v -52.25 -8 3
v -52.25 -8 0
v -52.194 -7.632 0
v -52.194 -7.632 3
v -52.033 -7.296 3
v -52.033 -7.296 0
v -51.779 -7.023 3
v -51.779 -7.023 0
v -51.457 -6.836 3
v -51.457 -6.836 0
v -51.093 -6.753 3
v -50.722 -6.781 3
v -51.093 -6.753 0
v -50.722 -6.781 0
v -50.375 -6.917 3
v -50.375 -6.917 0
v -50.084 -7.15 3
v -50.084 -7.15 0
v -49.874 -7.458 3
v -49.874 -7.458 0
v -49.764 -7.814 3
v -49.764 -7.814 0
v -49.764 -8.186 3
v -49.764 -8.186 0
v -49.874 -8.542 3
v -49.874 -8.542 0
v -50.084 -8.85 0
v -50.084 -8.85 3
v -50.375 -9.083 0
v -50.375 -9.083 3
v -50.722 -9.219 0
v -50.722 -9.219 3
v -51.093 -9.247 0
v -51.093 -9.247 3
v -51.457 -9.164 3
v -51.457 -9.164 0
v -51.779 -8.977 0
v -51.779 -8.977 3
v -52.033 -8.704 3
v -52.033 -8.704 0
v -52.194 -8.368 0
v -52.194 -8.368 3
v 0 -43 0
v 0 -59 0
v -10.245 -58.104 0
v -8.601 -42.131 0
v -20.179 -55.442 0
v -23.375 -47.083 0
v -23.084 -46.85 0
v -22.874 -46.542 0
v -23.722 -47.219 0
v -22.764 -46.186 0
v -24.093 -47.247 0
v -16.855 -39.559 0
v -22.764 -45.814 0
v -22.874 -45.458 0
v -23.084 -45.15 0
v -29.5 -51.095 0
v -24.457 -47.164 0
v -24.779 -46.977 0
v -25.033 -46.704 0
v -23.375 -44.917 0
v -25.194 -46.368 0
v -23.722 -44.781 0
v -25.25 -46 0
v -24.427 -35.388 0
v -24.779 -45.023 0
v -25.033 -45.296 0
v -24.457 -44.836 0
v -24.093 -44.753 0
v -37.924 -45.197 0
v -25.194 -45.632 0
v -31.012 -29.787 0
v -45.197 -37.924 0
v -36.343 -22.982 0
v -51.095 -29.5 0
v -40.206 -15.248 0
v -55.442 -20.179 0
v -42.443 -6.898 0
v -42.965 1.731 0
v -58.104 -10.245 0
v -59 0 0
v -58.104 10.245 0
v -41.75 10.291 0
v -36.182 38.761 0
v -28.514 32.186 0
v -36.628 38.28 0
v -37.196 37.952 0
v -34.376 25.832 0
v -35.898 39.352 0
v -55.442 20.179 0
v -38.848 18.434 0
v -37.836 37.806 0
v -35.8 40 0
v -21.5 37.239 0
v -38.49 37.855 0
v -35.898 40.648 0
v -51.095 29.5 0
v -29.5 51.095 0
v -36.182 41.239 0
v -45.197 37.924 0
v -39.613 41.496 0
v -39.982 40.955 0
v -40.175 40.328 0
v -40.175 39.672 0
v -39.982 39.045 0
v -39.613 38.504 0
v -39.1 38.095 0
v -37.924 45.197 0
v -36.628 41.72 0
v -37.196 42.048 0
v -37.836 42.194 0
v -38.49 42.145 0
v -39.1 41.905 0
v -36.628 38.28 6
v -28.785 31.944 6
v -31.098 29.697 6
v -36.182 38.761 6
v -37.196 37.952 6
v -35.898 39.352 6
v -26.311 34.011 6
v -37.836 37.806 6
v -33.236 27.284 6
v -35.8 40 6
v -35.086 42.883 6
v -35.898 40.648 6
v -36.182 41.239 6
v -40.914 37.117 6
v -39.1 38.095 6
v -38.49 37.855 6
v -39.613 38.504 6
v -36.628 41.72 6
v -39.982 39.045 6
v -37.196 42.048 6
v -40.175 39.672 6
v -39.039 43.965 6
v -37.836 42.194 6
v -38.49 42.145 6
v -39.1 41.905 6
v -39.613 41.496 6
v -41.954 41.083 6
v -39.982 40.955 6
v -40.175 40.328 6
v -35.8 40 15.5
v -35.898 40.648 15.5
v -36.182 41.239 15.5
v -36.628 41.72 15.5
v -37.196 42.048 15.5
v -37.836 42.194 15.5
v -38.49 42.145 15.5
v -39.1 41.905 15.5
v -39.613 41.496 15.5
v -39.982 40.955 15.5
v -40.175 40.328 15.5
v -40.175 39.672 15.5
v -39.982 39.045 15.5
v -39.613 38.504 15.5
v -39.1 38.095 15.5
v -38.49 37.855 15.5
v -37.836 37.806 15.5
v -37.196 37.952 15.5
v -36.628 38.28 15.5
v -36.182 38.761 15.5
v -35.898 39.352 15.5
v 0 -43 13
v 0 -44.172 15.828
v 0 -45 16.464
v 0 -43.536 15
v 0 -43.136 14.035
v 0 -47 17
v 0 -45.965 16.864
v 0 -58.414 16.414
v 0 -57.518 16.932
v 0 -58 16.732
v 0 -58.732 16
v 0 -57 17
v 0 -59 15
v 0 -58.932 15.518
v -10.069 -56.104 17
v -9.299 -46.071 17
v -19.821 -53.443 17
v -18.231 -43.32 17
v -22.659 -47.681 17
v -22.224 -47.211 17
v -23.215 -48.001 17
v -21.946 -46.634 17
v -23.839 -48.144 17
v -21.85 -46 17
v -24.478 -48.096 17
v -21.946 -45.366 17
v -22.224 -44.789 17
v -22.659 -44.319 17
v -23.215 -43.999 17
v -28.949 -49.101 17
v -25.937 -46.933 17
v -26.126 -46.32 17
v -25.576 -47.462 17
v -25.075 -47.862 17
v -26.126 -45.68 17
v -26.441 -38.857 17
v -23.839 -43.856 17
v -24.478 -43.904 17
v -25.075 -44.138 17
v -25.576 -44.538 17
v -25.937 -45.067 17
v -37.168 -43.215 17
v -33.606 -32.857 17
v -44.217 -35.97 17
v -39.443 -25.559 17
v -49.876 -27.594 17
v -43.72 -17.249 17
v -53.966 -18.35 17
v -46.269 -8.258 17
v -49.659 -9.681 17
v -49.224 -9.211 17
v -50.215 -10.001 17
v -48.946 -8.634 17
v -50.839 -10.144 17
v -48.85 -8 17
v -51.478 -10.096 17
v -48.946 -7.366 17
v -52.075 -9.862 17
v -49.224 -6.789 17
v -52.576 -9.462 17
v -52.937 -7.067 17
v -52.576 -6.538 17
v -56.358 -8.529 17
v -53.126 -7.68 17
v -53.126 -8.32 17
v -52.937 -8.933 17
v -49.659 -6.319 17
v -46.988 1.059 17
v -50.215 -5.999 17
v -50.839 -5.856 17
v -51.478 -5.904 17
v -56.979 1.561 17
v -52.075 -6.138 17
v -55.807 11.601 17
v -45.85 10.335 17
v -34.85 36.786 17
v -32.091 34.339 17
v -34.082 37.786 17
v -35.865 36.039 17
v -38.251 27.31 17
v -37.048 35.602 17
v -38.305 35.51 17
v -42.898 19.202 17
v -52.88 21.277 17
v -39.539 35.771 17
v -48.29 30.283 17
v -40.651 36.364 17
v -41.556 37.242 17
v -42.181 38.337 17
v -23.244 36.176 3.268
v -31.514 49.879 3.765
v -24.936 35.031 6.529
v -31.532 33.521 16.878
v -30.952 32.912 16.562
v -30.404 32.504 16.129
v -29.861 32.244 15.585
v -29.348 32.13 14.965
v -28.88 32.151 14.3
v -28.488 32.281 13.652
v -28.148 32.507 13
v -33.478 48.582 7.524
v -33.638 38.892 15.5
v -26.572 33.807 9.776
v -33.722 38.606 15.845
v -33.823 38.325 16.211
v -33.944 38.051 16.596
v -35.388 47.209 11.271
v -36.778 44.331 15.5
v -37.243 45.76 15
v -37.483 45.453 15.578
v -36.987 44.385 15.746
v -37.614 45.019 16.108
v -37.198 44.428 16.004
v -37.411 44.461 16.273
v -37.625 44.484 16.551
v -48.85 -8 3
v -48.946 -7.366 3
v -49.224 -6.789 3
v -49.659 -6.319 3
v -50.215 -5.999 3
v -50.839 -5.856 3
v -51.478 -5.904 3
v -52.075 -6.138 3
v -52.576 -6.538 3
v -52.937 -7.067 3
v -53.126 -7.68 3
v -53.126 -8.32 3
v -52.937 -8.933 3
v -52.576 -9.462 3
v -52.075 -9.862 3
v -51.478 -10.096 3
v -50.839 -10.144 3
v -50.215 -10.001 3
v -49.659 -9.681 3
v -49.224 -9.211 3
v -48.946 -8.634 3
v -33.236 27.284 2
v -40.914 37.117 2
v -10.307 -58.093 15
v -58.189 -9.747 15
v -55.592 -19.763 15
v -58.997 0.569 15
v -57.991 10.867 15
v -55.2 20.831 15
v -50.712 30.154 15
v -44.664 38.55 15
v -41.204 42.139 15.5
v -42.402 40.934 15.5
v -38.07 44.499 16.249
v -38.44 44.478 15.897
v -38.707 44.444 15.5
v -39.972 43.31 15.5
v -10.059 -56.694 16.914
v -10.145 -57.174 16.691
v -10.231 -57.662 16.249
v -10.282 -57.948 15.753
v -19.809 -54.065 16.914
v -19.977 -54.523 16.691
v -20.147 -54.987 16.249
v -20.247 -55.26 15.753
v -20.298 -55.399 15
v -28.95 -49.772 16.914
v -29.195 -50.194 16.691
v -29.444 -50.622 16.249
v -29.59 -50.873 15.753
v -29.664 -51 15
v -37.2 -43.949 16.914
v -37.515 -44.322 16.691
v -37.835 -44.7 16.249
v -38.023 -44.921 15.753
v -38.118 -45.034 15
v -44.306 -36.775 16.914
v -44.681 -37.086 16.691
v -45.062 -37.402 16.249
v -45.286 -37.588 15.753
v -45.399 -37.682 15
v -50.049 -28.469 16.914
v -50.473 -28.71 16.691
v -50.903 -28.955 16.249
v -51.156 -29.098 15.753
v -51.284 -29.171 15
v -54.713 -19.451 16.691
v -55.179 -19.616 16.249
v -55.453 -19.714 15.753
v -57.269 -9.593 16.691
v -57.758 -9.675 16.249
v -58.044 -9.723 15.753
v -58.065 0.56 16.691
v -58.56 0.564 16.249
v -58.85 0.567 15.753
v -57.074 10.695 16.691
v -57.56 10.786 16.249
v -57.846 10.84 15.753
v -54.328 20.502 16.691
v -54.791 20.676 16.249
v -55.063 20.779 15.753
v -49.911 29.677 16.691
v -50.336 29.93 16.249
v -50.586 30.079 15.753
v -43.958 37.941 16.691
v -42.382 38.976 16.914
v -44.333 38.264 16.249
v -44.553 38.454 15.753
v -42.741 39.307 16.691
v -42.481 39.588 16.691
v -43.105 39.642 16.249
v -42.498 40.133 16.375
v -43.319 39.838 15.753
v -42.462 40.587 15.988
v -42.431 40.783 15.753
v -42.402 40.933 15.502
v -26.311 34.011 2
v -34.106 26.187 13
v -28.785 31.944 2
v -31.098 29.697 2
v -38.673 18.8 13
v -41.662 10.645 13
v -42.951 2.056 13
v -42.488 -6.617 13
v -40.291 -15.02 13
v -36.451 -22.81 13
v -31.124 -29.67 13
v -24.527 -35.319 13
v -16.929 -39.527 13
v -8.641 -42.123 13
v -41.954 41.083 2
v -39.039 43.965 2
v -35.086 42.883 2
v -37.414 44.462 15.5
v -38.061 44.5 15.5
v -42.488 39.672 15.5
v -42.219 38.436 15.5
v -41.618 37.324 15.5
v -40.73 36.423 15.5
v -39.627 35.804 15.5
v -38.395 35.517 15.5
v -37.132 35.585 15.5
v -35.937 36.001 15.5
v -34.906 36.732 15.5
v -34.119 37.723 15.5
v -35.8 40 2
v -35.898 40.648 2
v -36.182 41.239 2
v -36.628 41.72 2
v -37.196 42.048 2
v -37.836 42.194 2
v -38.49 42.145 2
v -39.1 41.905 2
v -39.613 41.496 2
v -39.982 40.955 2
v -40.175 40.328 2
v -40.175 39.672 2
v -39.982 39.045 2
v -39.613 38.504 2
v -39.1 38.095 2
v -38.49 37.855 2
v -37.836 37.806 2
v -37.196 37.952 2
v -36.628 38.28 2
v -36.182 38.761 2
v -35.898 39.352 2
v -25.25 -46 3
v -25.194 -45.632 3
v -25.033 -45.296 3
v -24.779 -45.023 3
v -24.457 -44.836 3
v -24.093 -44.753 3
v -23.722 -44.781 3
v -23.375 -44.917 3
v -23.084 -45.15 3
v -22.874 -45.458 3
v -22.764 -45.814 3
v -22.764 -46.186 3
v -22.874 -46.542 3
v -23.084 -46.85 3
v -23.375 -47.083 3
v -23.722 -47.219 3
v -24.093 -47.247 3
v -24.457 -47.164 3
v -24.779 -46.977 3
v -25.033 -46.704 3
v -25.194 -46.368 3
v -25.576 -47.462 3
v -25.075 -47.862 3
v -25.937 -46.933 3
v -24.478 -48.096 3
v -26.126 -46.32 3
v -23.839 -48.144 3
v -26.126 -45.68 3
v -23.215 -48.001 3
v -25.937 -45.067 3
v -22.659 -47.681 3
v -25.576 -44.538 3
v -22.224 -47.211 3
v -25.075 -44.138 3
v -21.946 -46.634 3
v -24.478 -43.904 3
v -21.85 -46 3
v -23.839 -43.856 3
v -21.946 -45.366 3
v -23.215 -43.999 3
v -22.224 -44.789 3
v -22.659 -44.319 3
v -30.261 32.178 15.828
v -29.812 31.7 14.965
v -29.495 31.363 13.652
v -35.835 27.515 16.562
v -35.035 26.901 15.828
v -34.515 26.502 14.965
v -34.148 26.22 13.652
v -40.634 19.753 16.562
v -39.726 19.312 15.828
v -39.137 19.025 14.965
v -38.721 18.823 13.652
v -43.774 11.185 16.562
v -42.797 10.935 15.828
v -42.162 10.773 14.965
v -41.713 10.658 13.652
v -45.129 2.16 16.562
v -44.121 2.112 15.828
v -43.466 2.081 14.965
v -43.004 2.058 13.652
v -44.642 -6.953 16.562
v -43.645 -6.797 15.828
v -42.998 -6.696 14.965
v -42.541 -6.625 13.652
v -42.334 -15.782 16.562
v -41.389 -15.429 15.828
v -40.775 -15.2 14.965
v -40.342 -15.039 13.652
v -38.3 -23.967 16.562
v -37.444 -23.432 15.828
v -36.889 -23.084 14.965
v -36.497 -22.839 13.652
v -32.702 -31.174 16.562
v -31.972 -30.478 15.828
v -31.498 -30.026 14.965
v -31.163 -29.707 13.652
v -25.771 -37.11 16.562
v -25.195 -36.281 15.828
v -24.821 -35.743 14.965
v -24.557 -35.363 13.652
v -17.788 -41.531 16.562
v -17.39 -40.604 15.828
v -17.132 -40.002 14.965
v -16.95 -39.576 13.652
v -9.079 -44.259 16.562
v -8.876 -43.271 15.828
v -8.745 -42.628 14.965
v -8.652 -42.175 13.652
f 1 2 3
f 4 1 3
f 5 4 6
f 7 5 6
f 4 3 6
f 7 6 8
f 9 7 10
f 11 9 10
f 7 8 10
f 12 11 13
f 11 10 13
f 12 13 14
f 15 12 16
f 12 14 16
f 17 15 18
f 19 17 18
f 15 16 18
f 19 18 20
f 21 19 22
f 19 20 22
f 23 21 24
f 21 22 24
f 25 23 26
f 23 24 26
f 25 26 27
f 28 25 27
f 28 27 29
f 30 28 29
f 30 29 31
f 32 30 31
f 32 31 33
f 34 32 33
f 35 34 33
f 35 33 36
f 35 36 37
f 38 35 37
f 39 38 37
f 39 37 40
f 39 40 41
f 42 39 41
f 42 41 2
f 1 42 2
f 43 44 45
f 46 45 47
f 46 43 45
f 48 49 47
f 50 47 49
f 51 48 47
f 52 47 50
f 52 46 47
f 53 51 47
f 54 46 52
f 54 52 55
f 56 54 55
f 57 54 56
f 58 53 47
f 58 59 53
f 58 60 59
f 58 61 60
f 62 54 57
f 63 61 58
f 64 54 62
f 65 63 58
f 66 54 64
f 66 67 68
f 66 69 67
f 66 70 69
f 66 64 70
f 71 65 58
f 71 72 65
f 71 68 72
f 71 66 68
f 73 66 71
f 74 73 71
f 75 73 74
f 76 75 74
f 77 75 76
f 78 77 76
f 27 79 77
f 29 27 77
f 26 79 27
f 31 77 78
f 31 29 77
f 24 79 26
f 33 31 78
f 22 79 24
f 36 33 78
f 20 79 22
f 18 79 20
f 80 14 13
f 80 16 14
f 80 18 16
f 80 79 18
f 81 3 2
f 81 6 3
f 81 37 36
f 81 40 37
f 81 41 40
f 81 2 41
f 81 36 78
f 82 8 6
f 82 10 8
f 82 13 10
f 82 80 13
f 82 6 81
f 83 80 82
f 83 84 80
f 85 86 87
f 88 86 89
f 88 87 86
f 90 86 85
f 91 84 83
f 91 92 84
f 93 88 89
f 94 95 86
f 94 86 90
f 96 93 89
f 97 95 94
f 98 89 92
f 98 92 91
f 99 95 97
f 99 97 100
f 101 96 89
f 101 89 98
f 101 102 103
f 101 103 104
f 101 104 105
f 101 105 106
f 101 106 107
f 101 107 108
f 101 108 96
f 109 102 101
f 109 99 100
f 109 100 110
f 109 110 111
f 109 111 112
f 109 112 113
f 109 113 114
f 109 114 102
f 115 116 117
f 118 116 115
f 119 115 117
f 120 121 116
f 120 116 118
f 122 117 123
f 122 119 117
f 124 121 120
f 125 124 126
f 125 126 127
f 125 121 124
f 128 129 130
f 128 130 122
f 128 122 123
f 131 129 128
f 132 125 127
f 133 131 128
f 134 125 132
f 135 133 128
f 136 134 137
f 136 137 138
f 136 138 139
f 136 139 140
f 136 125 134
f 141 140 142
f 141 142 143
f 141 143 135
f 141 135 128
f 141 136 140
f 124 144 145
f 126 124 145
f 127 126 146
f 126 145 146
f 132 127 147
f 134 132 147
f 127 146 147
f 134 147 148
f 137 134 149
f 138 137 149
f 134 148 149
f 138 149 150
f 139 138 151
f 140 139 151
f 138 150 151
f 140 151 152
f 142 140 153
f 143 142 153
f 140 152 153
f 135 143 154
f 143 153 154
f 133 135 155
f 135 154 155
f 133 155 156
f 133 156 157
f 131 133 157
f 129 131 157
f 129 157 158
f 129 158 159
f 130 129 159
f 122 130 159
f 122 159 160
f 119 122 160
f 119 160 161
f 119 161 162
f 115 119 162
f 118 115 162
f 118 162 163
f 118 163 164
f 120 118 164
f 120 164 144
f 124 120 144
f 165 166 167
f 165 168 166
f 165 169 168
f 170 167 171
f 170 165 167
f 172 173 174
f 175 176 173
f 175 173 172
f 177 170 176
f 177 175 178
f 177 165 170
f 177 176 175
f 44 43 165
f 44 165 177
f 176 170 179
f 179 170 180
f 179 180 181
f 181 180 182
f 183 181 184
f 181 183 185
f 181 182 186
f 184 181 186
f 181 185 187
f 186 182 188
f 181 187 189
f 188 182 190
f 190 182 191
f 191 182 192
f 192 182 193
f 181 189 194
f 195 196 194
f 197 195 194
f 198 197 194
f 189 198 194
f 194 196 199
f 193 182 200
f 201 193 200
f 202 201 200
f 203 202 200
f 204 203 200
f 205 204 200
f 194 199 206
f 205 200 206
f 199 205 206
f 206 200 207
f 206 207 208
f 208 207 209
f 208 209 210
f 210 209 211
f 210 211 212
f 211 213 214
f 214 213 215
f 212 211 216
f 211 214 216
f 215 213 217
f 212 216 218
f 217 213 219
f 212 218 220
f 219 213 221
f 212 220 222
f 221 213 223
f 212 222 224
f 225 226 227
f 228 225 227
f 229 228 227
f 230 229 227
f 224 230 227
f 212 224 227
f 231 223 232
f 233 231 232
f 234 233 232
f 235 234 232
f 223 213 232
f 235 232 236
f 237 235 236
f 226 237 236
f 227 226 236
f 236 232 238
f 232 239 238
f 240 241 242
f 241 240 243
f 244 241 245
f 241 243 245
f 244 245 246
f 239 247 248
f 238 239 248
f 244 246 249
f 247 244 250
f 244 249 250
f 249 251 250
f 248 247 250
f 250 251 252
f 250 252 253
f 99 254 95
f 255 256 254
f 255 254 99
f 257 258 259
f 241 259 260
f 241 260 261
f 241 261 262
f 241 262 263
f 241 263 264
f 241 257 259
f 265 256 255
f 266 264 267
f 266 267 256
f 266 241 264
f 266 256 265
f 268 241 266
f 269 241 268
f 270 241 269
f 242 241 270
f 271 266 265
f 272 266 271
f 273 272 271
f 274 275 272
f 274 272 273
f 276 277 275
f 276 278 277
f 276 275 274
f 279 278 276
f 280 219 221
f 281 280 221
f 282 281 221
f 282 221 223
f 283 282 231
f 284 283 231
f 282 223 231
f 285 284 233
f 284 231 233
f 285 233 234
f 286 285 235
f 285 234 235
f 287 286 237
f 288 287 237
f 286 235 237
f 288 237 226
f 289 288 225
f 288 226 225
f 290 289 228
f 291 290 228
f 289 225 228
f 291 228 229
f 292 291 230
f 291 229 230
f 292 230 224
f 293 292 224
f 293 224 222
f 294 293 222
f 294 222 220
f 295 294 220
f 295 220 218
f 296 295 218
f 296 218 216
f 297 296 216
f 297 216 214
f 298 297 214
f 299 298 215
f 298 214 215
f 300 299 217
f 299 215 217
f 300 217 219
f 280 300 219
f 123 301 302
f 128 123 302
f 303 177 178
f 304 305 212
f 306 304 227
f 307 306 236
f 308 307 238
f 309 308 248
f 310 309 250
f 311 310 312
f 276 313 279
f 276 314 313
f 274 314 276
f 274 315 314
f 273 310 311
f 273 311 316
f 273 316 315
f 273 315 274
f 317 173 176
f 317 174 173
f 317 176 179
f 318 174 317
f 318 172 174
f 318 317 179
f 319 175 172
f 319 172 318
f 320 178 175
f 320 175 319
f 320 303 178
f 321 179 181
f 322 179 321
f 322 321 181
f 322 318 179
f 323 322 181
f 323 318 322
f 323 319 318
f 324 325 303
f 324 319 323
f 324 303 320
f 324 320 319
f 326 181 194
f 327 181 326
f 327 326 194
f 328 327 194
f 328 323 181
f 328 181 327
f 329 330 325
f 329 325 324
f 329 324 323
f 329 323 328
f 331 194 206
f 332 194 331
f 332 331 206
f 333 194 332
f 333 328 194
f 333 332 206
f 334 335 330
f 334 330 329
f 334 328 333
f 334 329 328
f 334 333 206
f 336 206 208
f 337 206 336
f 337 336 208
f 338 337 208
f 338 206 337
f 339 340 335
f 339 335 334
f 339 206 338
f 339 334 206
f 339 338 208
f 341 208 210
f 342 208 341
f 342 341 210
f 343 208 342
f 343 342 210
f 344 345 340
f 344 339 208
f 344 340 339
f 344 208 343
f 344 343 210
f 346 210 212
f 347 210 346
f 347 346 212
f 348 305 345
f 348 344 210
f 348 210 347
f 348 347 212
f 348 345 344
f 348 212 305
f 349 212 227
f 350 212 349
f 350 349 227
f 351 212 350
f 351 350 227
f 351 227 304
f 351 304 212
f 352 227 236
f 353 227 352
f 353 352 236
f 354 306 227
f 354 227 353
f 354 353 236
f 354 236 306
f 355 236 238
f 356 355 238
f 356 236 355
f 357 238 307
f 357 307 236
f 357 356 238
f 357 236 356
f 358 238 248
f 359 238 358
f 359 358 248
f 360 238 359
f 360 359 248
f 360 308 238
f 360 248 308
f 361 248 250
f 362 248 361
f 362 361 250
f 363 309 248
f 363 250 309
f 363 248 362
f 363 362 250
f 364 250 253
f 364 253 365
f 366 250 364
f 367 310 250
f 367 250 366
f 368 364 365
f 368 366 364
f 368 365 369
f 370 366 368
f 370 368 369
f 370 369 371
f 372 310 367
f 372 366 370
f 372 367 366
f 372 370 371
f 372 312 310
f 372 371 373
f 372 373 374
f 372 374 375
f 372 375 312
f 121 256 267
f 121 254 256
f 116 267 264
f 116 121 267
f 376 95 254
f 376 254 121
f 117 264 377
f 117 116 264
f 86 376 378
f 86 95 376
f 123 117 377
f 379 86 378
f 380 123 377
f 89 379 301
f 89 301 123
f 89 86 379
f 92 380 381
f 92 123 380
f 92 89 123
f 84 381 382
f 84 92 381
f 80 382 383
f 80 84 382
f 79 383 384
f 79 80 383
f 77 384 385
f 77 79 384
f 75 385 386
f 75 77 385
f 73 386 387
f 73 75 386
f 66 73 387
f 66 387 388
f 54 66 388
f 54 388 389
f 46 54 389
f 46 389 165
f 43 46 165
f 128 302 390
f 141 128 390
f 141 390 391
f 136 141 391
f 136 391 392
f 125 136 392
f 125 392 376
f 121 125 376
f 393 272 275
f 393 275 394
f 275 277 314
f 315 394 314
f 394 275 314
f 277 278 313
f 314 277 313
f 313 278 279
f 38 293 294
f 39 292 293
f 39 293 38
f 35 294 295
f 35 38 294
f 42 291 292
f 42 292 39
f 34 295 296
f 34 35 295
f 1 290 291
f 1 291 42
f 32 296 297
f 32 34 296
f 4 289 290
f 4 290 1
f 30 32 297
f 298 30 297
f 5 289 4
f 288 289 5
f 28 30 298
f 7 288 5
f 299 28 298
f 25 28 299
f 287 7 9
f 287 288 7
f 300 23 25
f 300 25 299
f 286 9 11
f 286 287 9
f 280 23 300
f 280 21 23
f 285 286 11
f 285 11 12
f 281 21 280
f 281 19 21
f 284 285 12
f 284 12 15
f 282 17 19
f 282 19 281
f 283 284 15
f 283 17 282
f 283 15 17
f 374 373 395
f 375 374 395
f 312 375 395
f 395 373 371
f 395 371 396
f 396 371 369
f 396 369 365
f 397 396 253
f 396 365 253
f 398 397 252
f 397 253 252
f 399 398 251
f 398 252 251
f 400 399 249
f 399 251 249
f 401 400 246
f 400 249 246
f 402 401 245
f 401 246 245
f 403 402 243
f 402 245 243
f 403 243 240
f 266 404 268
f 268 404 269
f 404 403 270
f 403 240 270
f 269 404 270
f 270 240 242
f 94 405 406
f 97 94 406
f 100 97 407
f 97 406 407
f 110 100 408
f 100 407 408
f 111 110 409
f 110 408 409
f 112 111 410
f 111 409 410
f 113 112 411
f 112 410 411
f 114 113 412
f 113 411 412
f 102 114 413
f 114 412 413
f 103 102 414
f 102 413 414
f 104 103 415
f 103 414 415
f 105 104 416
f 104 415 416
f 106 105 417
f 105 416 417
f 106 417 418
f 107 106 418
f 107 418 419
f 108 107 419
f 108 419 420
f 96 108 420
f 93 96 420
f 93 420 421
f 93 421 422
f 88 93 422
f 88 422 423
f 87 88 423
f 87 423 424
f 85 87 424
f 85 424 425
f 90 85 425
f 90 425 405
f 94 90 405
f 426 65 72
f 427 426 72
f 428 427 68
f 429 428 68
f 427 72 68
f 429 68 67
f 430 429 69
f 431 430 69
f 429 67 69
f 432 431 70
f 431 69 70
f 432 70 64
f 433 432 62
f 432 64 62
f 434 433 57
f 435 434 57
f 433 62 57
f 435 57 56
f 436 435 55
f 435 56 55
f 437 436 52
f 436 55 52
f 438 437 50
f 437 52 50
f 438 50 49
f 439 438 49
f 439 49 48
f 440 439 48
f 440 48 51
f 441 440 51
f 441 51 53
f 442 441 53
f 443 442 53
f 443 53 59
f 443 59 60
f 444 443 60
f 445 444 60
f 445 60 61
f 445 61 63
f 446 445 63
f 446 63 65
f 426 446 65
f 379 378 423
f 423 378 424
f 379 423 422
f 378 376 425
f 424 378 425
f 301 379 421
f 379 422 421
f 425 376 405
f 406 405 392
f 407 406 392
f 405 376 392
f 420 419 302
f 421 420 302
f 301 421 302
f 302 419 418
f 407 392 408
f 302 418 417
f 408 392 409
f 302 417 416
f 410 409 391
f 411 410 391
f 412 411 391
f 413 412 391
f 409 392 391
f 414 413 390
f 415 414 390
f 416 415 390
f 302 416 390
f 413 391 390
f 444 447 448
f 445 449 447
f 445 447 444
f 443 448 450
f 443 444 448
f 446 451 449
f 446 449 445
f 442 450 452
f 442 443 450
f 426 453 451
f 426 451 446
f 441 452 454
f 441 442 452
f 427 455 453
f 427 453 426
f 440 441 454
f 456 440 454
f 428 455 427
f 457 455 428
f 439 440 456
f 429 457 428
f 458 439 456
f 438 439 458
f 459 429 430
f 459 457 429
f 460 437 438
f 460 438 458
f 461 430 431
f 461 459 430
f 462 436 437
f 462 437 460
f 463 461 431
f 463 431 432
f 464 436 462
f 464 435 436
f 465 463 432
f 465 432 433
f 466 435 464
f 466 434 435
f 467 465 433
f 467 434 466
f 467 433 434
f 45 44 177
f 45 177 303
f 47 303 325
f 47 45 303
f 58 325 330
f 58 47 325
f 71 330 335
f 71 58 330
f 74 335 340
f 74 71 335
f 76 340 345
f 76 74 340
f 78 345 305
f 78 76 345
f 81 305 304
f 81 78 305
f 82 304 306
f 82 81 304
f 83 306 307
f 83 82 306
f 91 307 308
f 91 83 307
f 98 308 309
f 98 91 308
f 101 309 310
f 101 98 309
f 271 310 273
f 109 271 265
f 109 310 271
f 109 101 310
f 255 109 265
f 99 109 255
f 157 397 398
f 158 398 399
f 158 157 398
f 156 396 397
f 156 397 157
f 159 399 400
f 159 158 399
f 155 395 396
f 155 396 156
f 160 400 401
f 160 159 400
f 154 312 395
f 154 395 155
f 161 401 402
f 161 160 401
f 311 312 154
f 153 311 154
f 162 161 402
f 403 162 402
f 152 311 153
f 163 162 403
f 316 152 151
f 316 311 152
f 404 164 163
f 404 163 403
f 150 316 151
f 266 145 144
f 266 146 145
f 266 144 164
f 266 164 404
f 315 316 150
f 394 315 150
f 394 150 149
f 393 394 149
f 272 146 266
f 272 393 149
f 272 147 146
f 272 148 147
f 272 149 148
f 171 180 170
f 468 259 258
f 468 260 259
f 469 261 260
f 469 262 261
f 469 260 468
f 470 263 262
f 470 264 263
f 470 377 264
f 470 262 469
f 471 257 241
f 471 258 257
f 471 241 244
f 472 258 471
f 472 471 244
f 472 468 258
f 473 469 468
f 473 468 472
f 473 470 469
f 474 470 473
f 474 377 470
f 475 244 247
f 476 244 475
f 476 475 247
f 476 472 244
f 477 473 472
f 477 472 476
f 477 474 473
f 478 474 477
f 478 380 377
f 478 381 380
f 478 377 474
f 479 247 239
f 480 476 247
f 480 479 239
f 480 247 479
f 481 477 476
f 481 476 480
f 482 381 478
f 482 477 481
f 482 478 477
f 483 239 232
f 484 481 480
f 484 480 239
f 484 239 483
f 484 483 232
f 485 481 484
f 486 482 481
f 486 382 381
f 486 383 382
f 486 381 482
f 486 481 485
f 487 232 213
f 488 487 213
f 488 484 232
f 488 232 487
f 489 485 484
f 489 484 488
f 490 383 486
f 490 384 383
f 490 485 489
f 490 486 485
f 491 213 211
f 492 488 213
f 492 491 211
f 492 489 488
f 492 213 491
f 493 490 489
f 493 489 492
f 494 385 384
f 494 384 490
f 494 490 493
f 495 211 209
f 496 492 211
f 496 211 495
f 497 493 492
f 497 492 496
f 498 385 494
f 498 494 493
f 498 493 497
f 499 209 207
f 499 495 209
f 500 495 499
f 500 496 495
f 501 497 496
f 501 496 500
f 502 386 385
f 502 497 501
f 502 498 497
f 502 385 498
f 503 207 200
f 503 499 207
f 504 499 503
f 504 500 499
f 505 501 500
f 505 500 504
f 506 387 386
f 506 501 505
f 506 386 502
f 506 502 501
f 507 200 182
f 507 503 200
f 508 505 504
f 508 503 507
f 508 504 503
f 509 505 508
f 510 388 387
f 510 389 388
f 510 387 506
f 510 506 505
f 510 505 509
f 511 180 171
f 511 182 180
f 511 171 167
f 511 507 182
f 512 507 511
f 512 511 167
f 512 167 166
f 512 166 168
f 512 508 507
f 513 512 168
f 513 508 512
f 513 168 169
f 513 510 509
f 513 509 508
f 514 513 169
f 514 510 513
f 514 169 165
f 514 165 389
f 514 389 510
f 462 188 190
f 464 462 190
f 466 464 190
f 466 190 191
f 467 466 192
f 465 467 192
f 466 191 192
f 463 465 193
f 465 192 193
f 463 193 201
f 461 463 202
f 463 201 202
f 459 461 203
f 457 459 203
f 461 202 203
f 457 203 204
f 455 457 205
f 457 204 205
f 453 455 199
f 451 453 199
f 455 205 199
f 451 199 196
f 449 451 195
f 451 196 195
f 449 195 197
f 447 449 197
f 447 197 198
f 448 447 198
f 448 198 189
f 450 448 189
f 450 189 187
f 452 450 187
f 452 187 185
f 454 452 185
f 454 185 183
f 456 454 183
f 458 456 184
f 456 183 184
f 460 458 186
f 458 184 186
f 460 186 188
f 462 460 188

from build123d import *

# Parameters (mm, degrees)
BOSS_EXTRUDE1_DEPTH = 17
SKETCH2_R           = 2.2
CUT_EXTRUDE1_DEPTH  = 86.152803829
CUT_EXTRUDE2_DEPTH  = 86.152803829
DRAFT1_ANGLE        = -32
SKETCH4_R           = 4.5
CUT_EXTRUDE3_DEPTH  = 1.5
FILLET1_R           = 4
CUT_EXTRUDE4_START  = -2
CUT_EXTRUDE4_DEPTH  = 4
SKETCH10_R          = 1.25
CUT_EXTRUDE5_DEPTH  = 86.152803849
SKETCH11_R          = 2.15
CUT_EXTRUDE6_DEPTH  = 14
FILLET2_R           = 2


with BuildPart() as part:
    # Sketch1 → Boss-Extrude1 (new body)
    with BuildSketch(Plane.XY):
        with BuildLine():
            Line((0, 59), (0, 43))
            ThreePointArc((0, 43), (-43, 0), (0, -43))
            Line((0, -43), (0, -59))
            ThreePointArc((0, -59), (-59, 0), (0, 59))
        make_face()
    extrude(amount=BOSS_EXTRUDE1_DEPTH)

    # Sketch2 → Cut-Extrude1 (cut, through all)
    with BuildSketch(Plane.XY.offset(17)):
        with Locations((-38, 40)):
            Circle(SKETCH2_R)
    extrude(amount=-CUT_EXTRUDE1_DEPTH, mode=Mode.SUBTRACT)

    # Sketch3 → Cut-Extrude2 (cut, through all)
    with BuildSketch(Plane.XY.offset(17)):
        Polygon((0, 0), (-48.717134113, 84.380551482), (0, 84.380551482), align=None)
    extrude(amount=-CUT_EXTRUDE2_DEPTH, mode=Mode.SUBTRACT)

    # Draft1
    draft1_faces = [part.faces().sort_by_distance(p)[0] for p in [
        (-25.5, 44.167295593, 8.5),
    ]]
    draft(draft1_faces, Plane(origin=(0, 0, 0), x_dir=(-1, 0, 0), z_dir=(0, 0, -1)), DRAFT1_ANGLE)

    # Sketch4 → Cut-Extrude3 (cut)
    with BuildSketch(Plane.XY.offset(17)):
        with Locations((-38, 40)):
            Circle(SKETCH4_R)
    extrude(amount=-CUT_EXTRUDE3_DEPTH, mode=Mode.SUBTRACT)

    # Fillet1
    fillet1_edges = [part.edges().sort_by_distance(p)[0] for p in [
        (-39.826243941, -16.213275226, 17),
    ]]
    fillet(fillet1_edges, radius=FILLET1_R)

    # Sketch9 → Cut-Extrude4 (cut)
    with BuildSketch(Plane(origin=(0, 0, 0), x_dir=(-1, 0, 0), z_dir=(0, 0, -1)).offset(CUT_EXTRUDE4_START)):
        Polygon((40.91436799, 37.11732892), (41.953650381, 41.082581175), (39.039282391, 43.965252255), (35.08563201, 42.88267108), (21.021032653, 28.663421982), (28.6051551, 21.353976547), align=None)
    extrude(amount=-CUT_EXTRUDE4_DEPTH, mode=Mode.SUBTRACT)

    # Sketch10 → Cut-Extrude5 (cut, through all)
    with BuildSketch(Plane(origin=(0, 0, 0), x_dir=(-1, 0, 0), z_dir=(0, 0, -1))):
        with Locations((24, -46)):
            Circle(SKETCH10_R)
        with Locations((51, -8)):
            Circle(SKETCH10_R)
    extrude(amount=-CUT_EXTRUDE5_DEPTH, mode=Mode.SUBTRACT)

    # Sketch11 → Cut-Extrude6 (cut)
    with BuildSketch(Plane.XY.offset(17)):
        with Locations((-51, -8)):
            Circle(SKETCH11_R)
        with Locations((-24, -46)):
            Circle(SKETCH11_R)
    extrude(amount=-CUT_EXTRUDE6_DEPTH, mode=Mode.SUBTRACT)

    # Fillet2
    # the kernel refuses this fillet: 2 mm, written as the material it takes off along each edge
    with BuildSketch(Plane(origin=(0, 0, 17), x_dir=(-0.7194630608537799, 0.6945307077926146, 0), z_dir=(-0.6945307077926146, -0.7194630608537799, 0))) as fillet2_piece_1:
        with BuildLine():
            CenterArc((59 - FILLET2_R, FILLET2_R), FILLET2_R, 270, 90)
            Line((59 - FILLET2_R, 0), (59, 0))
            Line((59, 0), (59, FILLET2_R))
        make_face()
    revolve(axis=Axis((0, 0, 17), (0, 0, -1)), revolution_arc=10.493238867, mode=Mode.SUBTRACT)
    with BuildSketch(Plane(origin=(0, 0, 17), x_dir=(0.08471968524952049, -0.9964048248233356, 0), z_dir=(0.9964048248233356, 0.08471968524952049, 0))) as fillet2_piece_2:
        with BuildLine():
            CenterArc((59 - FILLET2_R, FILLET2_R), FILLET2_R, 270, 90)
            Line((59, FILLET2_R), (59, 0))
            Line((59, 0), (59 - FILLET2_R, 0))
        make_face()
    revolve(axis=Axis((0, 0, 17), (0, 0, -1)), revolution_arc=143.812006021, mode=Mode.SUBTRACT)


solid = part.part
